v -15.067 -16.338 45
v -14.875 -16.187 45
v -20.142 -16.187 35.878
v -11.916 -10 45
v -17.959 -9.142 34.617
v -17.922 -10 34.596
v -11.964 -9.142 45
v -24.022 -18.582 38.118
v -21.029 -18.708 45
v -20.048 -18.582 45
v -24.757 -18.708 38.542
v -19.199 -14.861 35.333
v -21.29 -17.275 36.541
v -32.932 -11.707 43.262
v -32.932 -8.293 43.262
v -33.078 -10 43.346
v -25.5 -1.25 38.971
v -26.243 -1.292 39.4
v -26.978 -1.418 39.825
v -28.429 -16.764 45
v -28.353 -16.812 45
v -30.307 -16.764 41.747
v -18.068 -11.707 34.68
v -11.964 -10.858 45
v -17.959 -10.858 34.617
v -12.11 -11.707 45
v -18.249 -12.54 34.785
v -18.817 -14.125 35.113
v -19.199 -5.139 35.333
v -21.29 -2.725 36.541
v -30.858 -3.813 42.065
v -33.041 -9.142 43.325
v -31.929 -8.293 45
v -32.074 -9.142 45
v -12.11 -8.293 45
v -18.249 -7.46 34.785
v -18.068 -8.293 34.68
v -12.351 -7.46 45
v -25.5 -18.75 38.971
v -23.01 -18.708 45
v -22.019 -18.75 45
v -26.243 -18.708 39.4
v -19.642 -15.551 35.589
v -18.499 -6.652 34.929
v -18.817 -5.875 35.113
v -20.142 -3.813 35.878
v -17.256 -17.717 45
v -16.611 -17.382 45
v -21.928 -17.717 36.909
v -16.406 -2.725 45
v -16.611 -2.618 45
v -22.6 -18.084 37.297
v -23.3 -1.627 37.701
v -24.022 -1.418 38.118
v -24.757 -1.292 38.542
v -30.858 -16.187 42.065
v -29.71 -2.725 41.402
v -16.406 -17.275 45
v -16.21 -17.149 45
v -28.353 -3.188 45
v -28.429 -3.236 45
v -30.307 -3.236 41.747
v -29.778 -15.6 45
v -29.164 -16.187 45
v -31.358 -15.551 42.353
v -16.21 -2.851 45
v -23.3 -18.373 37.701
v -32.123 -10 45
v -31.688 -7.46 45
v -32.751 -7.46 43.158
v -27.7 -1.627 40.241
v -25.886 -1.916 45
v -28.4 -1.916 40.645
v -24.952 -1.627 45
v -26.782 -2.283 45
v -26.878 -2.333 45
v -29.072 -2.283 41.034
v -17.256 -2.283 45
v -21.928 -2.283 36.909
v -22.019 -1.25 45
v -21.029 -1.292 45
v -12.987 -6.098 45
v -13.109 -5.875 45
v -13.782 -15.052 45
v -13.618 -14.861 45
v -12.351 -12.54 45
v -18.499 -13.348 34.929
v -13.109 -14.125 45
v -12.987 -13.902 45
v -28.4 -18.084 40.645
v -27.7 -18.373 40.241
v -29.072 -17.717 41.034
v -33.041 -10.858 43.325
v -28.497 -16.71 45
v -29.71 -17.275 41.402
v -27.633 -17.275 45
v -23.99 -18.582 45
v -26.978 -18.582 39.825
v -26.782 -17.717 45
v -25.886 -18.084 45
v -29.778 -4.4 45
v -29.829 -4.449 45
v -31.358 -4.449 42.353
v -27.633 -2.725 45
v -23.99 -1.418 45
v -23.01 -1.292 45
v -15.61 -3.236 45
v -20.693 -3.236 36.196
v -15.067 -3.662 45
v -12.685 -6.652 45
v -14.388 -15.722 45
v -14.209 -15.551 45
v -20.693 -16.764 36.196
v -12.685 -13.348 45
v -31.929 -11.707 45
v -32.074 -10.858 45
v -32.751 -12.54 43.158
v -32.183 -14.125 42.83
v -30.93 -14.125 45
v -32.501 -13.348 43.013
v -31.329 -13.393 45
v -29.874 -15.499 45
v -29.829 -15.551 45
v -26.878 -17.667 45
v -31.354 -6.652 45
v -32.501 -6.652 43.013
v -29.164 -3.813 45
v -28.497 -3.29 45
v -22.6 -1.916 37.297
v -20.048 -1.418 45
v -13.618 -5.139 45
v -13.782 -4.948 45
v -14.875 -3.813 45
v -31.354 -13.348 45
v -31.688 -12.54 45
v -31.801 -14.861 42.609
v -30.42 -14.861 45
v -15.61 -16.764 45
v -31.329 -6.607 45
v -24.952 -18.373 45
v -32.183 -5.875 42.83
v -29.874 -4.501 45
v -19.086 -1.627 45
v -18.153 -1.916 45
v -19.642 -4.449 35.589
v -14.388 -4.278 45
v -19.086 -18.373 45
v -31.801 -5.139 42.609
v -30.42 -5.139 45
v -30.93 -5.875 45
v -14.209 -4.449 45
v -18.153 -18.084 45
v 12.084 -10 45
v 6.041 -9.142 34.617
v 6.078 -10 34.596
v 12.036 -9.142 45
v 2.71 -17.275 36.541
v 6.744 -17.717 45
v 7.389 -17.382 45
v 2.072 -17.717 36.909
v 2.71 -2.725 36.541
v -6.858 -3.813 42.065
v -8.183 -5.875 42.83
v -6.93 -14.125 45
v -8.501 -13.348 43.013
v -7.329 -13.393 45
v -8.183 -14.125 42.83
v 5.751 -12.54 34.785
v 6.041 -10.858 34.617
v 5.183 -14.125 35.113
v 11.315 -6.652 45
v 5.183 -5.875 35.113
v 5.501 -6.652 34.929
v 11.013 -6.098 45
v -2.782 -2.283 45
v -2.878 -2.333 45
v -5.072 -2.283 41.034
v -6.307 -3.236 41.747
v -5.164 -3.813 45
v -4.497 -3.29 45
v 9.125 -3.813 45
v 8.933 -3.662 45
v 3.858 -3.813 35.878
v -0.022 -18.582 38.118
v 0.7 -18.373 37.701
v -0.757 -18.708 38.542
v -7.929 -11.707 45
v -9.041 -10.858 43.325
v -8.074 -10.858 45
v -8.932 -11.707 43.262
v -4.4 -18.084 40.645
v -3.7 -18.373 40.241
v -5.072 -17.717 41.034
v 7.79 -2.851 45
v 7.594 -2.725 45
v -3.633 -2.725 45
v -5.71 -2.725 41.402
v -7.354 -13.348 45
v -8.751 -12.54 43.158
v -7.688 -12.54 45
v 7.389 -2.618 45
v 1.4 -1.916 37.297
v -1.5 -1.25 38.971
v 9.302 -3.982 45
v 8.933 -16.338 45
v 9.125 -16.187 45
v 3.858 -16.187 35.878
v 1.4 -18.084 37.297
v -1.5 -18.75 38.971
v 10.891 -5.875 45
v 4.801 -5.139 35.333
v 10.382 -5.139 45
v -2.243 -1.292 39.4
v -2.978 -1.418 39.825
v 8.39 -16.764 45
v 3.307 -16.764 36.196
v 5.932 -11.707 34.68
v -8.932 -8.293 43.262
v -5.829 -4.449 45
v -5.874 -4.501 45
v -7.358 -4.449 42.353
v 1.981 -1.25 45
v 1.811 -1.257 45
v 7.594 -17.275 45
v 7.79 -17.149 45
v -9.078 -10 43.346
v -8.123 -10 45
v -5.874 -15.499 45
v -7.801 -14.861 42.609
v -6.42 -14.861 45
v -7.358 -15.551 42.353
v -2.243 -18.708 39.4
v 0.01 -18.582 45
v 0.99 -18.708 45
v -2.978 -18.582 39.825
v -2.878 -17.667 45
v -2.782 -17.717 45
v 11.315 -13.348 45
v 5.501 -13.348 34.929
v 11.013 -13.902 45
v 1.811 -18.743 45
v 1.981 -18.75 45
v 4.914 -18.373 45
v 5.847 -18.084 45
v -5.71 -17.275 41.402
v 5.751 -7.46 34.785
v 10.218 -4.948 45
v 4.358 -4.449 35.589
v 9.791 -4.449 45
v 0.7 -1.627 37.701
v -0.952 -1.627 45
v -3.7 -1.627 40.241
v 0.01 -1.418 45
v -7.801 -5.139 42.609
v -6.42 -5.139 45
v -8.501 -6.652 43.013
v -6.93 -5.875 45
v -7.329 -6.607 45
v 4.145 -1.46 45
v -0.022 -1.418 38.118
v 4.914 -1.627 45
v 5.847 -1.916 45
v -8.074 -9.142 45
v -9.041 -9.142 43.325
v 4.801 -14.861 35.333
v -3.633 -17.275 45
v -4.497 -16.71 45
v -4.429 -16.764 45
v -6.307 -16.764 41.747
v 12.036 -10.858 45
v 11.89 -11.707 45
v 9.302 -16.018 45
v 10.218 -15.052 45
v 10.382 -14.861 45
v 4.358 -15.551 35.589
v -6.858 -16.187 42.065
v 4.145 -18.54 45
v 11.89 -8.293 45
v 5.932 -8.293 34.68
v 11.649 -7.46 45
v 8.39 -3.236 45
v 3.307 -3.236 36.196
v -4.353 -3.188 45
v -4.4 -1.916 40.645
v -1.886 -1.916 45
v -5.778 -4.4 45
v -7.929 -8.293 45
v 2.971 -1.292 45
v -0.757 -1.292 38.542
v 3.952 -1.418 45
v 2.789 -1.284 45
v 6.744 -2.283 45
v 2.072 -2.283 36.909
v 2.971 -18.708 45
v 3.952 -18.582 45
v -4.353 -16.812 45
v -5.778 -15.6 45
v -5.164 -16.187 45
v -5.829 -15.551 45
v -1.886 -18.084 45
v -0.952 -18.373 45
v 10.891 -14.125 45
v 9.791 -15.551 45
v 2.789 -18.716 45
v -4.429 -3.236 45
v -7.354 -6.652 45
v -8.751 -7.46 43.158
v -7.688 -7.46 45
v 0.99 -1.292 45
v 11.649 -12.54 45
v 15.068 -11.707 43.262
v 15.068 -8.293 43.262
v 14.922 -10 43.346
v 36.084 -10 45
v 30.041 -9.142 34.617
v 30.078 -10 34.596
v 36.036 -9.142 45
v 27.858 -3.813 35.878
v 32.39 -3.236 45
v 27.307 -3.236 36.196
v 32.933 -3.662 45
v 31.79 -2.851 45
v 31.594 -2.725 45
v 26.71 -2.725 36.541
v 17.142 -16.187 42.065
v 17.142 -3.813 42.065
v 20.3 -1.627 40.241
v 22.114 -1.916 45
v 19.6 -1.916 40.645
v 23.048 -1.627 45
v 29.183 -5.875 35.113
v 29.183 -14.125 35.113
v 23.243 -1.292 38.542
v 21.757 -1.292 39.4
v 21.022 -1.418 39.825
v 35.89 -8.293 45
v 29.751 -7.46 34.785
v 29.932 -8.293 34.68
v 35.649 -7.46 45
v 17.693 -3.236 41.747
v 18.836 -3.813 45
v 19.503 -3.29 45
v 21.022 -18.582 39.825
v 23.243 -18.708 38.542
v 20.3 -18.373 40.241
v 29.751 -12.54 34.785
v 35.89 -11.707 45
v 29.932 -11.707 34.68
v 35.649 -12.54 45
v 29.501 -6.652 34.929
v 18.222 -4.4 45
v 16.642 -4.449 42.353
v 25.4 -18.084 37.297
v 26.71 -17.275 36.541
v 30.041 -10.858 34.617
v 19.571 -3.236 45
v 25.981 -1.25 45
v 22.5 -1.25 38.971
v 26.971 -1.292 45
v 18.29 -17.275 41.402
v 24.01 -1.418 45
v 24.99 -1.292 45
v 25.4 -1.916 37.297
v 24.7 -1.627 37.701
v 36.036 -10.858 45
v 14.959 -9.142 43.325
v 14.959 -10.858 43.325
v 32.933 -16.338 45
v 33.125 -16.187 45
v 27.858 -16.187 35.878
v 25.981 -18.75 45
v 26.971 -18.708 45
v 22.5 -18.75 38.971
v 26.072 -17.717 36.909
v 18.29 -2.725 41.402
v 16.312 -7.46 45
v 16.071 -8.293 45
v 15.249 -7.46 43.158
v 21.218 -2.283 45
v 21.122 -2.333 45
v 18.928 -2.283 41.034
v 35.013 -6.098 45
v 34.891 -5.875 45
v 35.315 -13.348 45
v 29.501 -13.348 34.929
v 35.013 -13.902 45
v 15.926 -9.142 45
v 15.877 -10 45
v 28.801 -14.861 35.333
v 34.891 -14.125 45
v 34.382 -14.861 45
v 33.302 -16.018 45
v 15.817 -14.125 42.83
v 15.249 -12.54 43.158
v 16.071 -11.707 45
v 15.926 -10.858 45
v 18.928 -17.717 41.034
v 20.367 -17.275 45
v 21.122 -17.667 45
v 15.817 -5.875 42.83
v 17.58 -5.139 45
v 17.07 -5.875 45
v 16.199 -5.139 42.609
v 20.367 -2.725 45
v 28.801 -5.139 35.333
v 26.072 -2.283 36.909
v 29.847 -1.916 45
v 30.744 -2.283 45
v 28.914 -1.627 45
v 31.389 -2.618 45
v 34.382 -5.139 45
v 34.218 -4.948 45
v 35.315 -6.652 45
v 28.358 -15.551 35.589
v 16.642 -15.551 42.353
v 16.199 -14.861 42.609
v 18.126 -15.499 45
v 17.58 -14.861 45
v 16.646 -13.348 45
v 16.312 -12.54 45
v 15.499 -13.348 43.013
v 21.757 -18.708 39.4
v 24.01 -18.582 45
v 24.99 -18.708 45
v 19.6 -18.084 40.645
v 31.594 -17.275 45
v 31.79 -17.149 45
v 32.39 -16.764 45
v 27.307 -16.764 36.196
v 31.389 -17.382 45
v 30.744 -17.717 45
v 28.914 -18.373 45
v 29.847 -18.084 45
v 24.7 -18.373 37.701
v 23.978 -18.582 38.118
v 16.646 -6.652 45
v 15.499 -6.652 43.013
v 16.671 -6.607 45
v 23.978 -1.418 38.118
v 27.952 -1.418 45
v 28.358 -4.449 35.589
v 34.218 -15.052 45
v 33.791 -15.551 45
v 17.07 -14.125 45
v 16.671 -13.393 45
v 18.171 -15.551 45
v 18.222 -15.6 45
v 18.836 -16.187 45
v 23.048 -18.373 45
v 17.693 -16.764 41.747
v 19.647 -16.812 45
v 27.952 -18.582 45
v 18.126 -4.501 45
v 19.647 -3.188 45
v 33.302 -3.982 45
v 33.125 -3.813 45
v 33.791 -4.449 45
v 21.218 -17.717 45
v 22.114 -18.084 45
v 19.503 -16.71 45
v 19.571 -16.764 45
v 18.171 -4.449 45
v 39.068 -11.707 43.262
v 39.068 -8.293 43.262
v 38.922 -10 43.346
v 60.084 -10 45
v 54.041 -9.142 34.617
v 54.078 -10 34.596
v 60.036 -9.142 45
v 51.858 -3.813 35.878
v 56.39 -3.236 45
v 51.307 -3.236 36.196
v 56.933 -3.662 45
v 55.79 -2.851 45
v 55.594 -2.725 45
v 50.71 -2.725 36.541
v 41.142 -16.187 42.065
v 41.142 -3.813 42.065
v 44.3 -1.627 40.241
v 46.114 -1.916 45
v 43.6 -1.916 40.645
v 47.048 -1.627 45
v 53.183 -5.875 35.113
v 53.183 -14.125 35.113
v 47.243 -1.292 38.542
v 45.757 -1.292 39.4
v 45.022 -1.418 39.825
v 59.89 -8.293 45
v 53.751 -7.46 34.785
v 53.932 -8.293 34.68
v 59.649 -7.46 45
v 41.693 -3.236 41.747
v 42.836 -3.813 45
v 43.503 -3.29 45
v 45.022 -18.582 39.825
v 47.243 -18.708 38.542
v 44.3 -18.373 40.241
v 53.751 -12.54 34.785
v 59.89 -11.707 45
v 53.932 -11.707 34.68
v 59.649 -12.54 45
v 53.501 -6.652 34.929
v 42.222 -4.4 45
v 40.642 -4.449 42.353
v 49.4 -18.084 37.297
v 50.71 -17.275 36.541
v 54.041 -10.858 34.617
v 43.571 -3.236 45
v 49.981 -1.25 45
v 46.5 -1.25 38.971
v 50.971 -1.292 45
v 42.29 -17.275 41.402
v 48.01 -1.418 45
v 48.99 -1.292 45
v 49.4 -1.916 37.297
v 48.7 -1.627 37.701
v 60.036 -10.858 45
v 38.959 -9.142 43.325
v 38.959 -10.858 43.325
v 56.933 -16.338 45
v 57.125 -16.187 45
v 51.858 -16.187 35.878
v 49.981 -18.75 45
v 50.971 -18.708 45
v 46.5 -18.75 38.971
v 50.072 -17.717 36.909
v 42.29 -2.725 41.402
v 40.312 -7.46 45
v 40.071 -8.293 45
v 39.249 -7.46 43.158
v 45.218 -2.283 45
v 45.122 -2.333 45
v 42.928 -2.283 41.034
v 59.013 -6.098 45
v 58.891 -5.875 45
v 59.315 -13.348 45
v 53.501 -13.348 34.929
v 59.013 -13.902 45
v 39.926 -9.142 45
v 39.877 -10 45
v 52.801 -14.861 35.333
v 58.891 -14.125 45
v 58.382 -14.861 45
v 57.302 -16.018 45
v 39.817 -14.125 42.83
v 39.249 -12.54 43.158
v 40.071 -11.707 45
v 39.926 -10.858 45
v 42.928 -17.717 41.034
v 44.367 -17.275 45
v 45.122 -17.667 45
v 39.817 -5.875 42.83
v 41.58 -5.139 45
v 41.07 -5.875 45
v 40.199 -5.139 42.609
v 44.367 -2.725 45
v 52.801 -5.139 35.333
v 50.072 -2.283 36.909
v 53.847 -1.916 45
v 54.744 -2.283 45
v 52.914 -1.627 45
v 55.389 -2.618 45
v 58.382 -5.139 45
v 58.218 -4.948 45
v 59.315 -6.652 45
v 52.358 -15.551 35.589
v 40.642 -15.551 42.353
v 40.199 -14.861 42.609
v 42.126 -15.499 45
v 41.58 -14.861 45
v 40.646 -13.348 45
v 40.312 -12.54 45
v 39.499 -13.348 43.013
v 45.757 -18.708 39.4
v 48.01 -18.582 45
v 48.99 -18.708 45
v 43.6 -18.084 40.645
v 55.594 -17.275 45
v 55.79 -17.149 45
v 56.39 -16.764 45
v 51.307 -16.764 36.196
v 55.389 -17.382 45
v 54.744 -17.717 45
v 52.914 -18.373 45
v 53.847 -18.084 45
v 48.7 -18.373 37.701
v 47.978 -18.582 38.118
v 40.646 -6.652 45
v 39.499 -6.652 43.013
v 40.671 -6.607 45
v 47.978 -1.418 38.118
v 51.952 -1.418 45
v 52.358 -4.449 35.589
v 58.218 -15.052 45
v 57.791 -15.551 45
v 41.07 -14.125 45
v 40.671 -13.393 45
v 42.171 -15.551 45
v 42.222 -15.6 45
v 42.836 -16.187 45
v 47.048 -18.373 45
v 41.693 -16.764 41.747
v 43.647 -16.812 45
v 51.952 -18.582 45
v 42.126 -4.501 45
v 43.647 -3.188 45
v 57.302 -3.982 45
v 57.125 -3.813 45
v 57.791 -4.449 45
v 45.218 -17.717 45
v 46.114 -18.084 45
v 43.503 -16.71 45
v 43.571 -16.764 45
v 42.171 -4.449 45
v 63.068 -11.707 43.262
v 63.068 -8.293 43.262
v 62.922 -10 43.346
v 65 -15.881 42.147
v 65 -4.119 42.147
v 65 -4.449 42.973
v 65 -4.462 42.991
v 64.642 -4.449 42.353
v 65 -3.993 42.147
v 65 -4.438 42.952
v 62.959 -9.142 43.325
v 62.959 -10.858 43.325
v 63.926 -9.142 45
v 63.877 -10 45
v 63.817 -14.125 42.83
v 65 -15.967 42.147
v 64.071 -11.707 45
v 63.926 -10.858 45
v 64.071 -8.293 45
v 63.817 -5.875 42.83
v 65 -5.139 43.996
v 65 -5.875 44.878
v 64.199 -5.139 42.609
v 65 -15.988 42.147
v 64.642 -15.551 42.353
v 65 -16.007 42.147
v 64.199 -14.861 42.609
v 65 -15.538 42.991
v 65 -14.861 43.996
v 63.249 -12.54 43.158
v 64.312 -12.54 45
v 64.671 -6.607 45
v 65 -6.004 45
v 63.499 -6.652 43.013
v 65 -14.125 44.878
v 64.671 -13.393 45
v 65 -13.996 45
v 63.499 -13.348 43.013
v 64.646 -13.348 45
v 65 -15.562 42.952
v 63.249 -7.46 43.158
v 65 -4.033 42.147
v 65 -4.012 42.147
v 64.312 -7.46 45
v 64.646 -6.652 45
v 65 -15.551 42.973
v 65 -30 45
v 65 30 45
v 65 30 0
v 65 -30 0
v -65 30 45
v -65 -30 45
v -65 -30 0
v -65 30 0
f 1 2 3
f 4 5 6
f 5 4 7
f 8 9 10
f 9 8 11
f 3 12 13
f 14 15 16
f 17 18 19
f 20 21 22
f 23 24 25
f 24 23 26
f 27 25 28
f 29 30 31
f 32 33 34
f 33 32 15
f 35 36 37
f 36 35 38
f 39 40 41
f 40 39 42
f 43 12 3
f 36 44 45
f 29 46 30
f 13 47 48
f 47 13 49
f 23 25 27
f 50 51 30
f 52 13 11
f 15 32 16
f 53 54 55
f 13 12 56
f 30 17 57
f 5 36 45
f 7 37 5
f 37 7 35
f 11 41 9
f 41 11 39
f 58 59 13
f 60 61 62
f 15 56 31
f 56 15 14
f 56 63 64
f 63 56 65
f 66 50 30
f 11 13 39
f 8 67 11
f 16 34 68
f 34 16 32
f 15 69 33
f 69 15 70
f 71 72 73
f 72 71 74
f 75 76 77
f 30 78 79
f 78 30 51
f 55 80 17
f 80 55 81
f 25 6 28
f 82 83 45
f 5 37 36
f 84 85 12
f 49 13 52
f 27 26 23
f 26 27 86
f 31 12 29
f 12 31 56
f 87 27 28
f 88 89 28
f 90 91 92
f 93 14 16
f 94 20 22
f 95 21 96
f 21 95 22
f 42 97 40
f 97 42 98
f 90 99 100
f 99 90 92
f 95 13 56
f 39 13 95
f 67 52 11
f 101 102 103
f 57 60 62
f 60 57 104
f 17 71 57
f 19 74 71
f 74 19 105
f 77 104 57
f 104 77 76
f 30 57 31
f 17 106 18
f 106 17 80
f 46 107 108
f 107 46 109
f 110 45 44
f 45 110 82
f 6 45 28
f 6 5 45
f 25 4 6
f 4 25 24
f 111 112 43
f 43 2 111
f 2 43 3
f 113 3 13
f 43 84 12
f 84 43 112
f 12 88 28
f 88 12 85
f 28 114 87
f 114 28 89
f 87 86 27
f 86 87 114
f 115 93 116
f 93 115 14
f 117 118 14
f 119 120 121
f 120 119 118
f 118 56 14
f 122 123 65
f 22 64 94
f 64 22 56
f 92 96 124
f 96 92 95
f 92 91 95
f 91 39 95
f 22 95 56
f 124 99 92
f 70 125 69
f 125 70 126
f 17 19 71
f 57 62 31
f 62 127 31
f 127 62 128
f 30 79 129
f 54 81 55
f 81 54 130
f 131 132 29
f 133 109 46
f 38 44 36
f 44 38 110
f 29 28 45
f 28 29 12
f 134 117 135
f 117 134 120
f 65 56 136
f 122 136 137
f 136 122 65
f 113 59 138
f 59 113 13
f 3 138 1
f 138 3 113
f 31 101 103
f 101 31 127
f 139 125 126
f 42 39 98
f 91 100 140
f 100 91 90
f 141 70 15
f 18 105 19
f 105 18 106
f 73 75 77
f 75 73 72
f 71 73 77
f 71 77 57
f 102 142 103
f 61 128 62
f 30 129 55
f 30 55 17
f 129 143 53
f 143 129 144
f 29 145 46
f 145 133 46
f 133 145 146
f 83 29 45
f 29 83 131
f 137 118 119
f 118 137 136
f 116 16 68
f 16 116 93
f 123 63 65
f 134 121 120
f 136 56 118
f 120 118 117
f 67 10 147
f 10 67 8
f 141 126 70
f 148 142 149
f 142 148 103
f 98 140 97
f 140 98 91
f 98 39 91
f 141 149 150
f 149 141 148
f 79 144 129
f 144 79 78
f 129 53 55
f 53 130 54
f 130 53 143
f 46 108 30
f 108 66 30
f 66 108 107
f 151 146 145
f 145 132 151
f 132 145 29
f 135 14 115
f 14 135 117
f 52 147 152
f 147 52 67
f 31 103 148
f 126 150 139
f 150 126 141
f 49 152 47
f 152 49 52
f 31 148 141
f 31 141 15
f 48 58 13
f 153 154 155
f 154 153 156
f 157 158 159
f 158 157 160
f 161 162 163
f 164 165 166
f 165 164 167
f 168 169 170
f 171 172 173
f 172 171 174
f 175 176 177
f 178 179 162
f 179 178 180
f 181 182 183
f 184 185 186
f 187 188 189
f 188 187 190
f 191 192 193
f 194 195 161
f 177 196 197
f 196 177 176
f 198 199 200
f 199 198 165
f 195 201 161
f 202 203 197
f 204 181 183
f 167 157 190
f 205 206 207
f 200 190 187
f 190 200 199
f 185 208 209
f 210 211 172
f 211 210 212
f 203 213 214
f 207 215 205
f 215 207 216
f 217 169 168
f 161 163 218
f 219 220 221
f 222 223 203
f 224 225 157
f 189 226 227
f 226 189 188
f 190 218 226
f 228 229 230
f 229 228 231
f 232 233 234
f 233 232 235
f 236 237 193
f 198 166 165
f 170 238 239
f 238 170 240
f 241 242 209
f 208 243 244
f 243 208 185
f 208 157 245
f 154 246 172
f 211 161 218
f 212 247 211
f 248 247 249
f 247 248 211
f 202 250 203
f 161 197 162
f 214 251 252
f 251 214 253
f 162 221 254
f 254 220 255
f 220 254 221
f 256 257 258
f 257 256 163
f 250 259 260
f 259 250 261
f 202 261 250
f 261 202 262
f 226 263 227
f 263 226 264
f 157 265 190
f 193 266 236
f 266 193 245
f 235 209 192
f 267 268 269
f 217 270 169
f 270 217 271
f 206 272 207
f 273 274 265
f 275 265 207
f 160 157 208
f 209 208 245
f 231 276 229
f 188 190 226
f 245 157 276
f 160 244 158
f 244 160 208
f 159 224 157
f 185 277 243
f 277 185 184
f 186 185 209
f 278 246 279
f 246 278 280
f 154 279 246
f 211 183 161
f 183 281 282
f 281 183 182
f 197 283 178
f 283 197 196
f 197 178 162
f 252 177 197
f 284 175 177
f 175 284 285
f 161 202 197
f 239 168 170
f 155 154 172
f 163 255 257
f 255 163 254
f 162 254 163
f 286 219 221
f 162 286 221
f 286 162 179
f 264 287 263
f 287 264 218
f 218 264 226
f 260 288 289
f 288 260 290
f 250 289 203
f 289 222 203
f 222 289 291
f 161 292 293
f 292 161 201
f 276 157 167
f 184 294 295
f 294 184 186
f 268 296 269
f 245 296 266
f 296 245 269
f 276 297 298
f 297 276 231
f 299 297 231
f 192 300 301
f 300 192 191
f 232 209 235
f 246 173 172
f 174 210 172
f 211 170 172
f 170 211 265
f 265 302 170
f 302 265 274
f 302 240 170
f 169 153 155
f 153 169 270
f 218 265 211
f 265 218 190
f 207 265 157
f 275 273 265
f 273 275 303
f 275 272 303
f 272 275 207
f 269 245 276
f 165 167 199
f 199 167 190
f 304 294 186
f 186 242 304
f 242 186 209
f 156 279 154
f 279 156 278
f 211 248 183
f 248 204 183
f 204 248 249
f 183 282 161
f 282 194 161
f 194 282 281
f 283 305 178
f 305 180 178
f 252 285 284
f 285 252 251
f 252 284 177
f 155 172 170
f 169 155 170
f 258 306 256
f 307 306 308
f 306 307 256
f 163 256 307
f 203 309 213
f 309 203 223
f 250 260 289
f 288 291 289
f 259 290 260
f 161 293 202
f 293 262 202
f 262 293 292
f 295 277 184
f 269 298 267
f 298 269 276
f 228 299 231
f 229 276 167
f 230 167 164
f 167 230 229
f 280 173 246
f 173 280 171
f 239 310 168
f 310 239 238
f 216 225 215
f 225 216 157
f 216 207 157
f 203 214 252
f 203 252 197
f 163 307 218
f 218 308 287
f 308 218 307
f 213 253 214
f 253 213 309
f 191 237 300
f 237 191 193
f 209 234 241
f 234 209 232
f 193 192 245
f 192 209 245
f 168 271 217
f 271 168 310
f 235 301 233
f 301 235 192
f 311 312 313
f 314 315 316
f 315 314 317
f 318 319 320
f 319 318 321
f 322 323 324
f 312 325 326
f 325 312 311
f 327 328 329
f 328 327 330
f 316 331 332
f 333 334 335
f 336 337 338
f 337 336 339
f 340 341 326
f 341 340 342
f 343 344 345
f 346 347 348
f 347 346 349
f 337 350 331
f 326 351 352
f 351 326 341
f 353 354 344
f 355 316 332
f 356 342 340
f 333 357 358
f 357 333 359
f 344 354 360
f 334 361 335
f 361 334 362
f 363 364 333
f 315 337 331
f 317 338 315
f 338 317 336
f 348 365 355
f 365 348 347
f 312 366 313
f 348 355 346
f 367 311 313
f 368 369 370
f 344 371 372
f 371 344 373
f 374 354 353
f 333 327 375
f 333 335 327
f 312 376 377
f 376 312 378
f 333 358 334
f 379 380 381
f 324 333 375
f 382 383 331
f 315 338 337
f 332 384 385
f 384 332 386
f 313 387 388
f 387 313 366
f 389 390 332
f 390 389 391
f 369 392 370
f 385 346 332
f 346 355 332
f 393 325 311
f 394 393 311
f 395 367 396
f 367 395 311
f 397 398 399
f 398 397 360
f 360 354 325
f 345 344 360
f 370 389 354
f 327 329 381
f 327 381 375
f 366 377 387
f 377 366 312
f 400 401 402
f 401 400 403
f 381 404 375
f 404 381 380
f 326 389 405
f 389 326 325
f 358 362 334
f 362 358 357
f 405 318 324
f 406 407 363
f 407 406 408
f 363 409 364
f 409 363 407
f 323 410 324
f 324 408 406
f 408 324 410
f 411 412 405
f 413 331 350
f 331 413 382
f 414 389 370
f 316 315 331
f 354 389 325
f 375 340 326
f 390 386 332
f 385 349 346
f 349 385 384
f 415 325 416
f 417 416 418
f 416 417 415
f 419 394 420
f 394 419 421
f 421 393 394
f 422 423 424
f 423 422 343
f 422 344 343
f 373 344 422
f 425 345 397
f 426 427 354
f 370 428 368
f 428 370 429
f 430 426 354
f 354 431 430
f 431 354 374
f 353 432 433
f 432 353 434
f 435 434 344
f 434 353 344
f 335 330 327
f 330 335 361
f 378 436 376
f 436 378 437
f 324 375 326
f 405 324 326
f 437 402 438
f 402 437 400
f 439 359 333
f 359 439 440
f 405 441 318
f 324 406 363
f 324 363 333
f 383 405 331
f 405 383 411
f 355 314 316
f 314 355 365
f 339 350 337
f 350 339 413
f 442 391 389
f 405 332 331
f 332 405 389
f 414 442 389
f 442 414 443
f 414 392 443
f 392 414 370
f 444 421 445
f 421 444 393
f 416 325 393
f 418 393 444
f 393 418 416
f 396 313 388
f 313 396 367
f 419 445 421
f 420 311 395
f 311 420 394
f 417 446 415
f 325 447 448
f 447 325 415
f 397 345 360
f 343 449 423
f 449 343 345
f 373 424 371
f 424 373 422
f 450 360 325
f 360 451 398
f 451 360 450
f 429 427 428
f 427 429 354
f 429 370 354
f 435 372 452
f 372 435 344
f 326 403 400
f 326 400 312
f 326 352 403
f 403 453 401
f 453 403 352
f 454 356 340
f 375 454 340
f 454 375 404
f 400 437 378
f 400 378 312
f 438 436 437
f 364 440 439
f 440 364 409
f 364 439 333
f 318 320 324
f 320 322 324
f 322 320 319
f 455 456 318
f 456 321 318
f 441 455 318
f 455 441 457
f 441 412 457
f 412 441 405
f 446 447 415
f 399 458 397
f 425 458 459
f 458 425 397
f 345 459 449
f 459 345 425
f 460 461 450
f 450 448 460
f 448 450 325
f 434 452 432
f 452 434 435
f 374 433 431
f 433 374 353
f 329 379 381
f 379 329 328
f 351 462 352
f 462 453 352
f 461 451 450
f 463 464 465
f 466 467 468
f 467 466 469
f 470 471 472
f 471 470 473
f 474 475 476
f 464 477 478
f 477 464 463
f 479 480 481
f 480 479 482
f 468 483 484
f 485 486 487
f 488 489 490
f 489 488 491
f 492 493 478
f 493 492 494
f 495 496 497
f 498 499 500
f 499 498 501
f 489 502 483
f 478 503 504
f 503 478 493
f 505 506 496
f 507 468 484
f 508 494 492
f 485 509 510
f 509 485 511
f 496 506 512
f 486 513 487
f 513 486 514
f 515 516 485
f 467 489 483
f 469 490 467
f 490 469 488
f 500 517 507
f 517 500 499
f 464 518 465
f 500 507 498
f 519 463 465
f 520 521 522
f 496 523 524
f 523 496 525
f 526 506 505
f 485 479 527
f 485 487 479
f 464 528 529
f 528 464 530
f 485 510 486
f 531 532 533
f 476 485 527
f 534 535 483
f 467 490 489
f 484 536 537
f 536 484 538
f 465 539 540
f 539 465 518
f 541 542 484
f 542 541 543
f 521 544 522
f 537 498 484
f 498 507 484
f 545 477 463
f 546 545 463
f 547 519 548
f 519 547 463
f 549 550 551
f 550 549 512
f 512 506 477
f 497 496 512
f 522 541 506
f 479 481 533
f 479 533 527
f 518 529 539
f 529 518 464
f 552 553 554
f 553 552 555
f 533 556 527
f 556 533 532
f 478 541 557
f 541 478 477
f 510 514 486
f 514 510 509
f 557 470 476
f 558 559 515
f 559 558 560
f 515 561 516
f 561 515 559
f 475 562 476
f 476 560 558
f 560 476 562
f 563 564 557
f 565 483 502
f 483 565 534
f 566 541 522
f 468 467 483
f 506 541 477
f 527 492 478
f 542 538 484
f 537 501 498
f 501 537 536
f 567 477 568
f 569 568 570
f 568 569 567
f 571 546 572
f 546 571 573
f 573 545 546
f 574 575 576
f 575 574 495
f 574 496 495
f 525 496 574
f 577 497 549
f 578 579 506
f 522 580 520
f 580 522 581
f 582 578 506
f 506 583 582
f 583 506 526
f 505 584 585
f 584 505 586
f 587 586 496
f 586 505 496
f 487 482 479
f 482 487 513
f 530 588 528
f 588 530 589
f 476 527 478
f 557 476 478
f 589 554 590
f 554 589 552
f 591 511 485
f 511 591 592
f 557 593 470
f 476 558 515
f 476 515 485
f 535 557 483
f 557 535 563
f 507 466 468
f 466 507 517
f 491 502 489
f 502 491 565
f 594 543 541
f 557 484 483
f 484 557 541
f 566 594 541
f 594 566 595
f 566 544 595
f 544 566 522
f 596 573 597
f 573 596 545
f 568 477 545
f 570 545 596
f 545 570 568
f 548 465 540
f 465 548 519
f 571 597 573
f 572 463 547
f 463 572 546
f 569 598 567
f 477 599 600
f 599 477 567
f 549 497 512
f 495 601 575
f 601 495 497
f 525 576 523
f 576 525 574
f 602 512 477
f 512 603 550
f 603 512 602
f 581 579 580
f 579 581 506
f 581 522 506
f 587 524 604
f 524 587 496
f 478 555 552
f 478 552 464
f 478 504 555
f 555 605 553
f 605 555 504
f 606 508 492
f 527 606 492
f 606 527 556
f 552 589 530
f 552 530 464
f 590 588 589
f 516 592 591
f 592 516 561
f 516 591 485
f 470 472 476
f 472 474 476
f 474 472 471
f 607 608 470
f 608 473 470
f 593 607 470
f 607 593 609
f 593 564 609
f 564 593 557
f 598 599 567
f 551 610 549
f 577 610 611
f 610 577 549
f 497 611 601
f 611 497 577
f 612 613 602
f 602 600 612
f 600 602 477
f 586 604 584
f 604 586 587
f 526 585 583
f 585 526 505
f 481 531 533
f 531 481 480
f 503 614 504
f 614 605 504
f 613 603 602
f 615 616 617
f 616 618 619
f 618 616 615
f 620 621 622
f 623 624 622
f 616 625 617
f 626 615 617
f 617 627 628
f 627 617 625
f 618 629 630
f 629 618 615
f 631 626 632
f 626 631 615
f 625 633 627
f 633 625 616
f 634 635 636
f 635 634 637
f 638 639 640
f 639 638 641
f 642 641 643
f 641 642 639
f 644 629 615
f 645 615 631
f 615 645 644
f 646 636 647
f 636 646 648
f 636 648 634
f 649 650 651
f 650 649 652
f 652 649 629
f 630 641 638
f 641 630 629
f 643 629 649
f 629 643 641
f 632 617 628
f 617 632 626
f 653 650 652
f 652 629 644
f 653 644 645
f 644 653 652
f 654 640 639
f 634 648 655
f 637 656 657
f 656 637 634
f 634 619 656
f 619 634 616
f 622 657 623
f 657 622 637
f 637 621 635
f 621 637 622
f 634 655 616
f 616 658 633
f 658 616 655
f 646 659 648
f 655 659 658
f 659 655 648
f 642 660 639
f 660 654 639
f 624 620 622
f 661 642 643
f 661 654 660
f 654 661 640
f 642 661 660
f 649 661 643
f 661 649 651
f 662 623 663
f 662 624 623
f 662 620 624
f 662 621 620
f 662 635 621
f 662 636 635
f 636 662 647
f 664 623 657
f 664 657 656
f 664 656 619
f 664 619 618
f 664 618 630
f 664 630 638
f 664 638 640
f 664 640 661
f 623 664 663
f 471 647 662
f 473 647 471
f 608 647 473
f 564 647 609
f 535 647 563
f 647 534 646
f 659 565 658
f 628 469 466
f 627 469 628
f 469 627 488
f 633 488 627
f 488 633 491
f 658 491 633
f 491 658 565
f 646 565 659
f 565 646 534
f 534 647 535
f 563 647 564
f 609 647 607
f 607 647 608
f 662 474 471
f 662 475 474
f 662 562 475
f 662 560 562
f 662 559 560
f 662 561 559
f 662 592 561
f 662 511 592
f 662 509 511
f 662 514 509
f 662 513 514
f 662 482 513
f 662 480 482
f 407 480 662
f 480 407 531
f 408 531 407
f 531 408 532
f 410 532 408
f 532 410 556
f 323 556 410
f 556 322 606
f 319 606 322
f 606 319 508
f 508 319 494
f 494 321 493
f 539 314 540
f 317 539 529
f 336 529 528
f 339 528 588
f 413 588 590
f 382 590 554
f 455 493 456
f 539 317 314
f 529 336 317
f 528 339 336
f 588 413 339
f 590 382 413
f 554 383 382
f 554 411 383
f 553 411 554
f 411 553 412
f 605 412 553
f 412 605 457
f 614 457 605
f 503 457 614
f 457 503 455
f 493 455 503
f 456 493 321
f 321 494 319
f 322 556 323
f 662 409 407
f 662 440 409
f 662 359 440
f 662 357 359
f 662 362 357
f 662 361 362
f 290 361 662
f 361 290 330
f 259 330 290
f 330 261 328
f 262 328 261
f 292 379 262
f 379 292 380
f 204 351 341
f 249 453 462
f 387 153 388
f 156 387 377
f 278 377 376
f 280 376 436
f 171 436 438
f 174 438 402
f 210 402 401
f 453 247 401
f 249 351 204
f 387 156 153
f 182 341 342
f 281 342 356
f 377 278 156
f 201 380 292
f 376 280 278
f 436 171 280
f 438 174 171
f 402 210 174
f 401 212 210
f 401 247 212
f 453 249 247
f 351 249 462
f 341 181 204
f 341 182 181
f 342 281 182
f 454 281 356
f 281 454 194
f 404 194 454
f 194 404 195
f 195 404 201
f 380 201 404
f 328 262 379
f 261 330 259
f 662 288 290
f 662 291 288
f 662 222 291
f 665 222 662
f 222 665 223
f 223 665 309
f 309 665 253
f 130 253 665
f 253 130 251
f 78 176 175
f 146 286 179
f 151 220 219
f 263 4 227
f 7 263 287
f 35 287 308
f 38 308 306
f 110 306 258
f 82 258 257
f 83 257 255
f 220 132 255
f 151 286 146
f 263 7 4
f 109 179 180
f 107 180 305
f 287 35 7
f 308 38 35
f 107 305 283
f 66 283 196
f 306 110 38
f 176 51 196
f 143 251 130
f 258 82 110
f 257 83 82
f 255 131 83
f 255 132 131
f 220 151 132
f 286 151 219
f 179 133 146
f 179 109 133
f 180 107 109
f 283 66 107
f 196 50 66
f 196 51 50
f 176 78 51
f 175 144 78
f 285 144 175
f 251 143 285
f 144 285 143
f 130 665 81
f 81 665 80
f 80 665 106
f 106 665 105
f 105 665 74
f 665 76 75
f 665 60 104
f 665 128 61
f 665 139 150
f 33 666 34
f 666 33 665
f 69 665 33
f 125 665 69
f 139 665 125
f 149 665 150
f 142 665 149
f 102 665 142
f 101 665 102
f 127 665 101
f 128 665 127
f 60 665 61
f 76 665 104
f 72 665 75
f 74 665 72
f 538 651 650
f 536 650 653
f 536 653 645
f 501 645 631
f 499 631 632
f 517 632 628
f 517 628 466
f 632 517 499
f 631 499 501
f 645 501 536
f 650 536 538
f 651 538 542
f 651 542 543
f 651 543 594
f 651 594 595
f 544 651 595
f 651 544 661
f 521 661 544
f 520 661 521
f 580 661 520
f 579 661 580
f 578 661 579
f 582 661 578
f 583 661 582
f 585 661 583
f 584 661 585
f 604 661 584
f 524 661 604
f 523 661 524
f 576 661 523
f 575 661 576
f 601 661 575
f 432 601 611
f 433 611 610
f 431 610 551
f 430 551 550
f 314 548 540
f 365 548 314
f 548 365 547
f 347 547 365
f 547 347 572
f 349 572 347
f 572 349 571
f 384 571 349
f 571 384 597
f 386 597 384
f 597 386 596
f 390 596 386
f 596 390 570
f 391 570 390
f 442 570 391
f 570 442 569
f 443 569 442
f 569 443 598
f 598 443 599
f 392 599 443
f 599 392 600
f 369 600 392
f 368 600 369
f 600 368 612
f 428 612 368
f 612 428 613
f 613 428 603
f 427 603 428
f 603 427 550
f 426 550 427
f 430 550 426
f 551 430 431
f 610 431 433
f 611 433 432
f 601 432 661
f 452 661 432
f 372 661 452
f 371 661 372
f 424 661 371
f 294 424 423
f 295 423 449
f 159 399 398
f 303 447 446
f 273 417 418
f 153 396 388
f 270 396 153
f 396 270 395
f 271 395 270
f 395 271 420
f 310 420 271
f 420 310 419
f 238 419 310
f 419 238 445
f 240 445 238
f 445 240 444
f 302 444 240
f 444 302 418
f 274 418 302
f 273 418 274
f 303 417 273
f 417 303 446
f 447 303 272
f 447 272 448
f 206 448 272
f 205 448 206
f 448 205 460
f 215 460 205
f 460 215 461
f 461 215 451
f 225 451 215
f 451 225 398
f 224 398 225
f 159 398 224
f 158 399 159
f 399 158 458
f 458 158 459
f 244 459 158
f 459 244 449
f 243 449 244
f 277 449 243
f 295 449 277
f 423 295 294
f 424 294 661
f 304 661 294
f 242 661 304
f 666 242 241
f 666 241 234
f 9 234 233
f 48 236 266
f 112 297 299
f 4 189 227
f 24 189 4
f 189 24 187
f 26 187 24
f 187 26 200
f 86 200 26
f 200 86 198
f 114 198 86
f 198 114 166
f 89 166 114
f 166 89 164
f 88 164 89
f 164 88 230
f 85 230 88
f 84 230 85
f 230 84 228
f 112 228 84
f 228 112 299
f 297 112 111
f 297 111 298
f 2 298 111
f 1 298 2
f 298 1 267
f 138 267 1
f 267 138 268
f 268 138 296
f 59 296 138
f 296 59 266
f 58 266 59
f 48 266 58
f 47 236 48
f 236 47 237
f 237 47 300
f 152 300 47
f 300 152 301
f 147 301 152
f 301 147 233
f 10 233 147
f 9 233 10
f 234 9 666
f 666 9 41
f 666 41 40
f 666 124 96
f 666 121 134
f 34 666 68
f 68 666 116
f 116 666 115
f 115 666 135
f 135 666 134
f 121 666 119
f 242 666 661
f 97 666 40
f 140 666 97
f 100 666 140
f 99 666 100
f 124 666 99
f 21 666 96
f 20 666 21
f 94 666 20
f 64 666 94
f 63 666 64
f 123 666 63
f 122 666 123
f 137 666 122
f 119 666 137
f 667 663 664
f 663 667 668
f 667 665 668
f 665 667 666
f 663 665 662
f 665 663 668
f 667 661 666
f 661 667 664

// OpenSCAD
// 15 mL conical tube rack – 5 tubes, 30° lean, for volume reading / supernatant pipetting
// Units: mm. Part rests on the XY plane (z = 0) and is centred on the origin in X and Y.

// ---- Block dimensions (measured with calipers) ----
L = 130;   // block length along X
W = 60;    // block depth along Y
H = 45;    // block height along Z

// ---- Hole / tube parameters ----
n_tubes   = 5;    // number of tubes
spacing   = 24;   // centre-to-centre spacing of hole axes along X
hole_d    = 17.5; // hole diameter, measured square to its axis
hole_depth= 40;   // hole depth measured along its axis, from the top face
y_top     = -10;  // Y coordinate where each hole axis meets the top face (z = H)
tilt      = 30;   // lean angle from vertical, in the YZ plane (down into block -> +Y)

// X positions of the five hole axes, centred on the block: -48,-24,0,+24,+48
x_pos = [-48, -24, 0, 24, 48];

// ---- Derived geometry ----
// A 30° tilt from vertical means the axis makes 60° with the +Z axis,
// so the unit vector pointing down into the block is (0, sin60, -cos60).
down_vec  = [0, sin(60), -cos(60)];   // direction from top face into the block
top_pt    = [0, y_top, H];            // point where the axis meets the top face
bot_pt    = top_pt + hole_depth * down_vec; // flat bottom of the blind hole

// ---- Build ----
$fn = 64;

difference() {
    // Solid block, centred on the origin in X and Y, resting on z = 0
    translate([-L/2, -W/2, 0])
        cube([L, W, H]);

    // Five blind holes, each a cylinder with a flat end square to its axis
    for (x = x_pos) {
        translate([x, 0, 0])
            rotate([0, tilt, 0])                 // tilt the axis 30° in the YZ plane
            translate([0, y_top, H])             // axis meets the top face at y = -10
            cylinder(h = hole_depth, r = hole_d / 2, $fn = 64);
    }
}
